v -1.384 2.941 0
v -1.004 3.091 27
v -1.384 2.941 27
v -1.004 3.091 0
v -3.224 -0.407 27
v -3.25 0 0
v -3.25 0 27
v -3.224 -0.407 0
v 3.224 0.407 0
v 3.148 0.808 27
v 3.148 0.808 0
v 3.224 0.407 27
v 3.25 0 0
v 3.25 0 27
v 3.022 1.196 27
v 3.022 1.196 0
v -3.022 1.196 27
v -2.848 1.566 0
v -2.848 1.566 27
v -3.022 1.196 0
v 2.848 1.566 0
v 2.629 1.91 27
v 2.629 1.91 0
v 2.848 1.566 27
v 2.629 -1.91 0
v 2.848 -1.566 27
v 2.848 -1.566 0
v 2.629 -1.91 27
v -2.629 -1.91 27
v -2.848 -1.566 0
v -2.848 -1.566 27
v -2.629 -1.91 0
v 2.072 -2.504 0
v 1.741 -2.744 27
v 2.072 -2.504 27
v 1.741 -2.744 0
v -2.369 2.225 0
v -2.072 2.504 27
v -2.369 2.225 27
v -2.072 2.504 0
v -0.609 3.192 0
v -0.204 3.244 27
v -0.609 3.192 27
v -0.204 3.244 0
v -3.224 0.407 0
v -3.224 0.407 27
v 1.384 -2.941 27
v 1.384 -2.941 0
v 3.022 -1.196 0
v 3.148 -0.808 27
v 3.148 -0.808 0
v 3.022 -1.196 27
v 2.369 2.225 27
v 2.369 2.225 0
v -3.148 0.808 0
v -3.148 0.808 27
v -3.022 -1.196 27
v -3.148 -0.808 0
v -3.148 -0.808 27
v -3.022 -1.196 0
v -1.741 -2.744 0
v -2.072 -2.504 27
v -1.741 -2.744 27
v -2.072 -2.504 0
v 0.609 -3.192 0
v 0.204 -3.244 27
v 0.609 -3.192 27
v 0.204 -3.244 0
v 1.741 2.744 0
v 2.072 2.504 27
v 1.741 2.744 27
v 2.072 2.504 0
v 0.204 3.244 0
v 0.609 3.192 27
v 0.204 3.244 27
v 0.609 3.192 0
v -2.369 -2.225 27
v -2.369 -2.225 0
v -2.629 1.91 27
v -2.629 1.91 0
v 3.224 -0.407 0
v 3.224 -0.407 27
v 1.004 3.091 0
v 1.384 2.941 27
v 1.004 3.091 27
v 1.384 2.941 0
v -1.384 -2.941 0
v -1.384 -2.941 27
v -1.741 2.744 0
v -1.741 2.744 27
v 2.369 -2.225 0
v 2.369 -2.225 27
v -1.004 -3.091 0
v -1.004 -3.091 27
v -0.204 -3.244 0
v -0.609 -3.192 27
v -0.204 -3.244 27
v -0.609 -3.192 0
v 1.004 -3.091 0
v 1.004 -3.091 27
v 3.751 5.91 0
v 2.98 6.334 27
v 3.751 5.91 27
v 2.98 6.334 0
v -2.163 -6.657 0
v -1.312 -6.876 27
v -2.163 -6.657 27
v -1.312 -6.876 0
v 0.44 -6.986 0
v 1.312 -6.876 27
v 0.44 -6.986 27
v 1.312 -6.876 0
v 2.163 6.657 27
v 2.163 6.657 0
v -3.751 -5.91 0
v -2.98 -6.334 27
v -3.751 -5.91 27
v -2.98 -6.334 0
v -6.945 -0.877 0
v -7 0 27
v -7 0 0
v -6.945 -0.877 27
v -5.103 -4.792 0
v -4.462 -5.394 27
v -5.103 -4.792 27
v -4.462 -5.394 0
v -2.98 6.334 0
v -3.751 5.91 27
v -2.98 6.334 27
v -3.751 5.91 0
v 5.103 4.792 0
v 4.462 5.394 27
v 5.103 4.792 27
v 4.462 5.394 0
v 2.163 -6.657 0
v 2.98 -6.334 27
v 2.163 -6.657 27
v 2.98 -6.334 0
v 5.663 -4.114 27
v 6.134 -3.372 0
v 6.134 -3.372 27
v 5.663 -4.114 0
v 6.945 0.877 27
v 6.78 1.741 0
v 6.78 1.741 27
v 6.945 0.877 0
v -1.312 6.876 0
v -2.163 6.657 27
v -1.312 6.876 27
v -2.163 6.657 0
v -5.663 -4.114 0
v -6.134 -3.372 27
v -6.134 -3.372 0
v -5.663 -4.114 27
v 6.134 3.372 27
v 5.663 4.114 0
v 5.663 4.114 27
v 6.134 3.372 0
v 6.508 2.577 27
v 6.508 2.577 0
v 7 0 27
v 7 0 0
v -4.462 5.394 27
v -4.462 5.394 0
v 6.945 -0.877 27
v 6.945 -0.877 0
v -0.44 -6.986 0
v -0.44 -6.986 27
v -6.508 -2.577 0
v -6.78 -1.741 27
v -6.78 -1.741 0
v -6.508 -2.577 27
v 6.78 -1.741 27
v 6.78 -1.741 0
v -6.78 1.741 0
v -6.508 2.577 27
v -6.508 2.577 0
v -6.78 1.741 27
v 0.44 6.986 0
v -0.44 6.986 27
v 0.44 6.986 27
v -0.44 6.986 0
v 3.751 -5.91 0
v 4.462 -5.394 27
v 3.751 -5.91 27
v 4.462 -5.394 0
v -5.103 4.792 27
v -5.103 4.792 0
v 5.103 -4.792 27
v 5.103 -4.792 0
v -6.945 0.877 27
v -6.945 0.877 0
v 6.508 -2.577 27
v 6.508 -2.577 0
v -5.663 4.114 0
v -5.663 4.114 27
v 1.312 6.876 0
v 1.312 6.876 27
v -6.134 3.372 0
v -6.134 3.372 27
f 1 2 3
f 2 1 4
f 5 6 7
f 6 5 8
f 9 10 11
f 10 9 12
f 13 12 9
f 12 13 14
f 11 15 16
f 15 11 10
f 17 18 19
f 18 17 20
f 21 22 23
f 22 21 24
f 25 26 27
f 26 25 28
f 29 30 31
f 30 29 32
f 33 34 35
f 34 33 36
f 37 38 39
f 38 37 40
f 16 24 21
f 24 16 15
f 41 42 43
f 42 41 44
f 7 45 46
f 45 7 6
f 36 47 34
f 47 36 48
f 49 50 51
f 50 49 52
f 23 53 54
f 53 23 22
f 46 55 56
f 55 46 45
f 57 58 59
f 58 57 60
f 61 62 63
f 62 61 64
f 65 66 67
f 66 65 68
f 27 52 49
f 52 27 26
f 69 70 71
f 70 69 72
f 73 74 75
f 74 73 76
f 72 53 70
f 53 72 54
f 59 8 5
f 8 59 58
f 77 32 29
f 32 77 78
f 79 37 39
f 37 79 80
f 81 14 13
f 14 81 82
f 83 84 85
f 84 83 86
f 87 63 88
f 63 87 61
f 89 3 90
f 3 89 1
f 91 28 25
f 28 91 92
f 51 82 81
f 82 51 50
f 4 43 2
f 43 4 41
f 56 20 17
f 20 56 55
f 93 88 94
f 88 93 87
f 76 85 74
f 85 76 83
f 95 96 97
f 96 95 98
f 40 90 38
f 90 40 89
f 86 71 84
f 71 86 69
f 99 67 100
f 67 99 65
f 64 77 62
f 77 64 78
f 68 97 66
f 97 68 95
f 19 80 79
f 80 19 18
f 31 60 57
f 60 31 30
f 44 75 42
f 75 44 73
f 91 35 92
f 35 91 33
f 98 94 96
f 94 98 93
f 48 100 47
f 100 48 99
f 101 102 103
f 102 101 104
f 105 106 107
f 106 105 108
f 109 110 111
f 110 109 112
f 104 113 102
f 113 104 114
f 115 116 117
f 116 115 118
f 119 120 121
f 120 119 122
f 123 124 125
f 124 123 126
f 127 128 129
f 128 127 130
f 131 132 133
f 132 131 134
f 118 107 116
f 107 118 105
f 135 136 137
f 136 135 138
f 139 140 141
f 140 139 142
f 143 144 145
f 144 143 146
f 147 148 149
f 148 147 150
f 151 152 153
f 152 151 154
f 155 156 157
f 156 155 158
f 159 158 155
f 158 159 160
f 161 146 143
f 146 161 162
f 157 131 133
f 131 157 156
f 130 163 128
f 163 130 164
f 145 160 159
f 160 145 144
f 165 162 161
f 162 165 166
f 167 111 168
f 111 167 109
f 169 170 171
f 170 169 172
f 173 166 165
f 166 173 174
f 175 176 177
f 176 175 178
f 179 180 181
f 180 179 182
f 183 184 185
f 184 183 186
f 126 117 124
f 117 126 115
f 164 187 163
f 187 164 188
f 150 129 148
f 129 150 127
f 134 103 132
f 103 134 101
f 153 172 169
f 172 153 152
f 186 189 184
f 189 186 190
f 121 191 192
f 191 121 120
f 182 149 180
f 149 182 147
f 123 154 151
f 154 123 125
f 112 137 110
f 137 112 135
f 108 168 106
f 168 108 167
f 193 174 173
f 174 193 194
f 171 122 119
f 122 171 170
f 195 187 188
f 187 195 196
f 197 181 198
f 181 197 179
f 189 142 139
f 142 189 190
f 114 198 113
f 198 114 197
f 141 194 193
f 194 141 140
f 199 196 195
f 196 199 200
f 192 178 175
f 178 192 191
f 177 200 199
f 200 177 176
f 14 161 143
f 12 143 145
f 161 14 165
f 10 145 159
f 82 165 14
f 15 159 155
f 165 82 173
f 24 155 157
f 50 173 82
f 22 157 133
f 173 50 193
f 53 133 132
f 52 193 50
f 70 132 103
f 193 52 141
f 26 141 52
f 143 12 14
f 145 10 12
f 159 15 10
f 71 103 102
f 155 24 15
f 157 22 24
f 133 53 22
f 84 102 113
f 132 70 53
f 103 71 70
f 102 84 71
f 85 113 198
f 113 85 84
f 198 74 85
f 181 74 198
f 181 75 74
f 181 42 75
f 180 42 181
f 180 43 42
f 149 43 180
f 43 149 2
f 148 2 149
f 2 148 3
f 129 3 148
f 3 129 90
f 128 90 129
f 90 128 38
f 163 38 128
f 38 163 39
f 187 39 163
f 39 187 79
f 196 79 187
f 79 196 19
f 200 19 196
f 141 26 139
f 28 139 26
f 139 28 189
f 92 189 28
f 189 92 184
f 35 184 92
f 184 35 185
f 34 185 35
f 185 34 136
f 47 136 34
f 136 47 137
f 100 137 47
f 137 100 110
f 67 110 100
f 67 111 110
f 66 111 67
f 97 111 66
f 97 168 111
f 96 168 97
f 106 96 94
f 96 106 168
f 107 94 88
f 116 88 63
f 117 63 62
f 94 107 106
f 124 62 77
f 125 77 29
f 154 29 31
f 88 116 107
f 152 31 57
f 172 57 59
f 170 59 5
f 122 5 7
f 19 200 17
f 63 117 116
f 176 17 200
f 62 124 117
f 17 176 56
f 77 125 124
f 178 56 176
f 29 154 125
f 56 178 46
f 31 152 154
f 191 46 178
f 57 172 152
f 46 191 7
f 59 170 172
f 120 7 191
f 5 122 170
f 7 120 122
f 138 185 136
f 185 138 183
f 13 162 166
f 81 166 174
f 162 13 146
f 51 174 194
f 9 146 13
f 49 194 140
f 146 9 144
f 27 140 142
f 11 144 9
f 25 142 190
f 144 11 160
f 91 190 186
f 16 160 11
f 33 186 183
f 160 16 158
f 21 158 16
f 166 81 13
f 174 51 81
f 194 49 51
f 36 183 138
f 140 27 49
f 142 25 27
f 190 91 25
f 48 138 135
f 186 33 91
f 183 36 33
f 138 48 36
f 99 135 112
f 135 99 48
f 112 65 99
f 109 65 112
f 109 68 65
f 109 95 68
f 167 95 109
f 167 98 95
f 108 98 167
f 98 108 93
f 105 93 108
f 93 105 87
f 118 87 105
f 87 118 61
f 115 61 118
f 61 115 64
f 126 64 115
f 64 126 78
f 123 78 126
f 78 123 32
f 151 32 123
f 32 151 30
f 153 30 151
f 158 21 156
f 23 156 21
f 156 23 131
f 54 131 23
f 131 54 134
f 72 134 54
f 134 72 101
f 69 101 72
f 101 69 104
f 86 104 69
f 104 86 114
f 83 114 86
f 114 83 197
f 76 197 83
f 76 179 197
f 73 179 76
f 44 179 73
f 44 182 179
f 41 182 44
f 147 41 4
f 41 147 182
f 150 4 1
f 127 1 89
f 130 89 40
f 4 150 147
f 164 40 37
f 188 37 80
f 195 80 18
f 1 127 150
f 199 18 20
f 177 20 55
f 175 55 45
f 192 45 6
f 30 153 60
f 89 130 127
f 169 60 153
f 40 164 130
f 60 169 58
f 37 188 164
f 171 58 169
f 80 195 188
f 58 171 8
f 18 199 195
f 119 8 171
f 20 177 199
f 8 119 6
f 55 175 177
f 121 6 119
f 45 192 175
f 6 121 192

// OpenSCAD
$fn = 50;

difference() {
	union() {
		cylinder(h = 27, r = 7.0);
	}
	union() {
		translate(v = [0, 0, -100]) {
			cylinder(h = 200, r = 3.25);
		}
		translate(v = [0, 0, -100]) {
			cylinder(h = 200, r = 1.8);
		}
	}
}
